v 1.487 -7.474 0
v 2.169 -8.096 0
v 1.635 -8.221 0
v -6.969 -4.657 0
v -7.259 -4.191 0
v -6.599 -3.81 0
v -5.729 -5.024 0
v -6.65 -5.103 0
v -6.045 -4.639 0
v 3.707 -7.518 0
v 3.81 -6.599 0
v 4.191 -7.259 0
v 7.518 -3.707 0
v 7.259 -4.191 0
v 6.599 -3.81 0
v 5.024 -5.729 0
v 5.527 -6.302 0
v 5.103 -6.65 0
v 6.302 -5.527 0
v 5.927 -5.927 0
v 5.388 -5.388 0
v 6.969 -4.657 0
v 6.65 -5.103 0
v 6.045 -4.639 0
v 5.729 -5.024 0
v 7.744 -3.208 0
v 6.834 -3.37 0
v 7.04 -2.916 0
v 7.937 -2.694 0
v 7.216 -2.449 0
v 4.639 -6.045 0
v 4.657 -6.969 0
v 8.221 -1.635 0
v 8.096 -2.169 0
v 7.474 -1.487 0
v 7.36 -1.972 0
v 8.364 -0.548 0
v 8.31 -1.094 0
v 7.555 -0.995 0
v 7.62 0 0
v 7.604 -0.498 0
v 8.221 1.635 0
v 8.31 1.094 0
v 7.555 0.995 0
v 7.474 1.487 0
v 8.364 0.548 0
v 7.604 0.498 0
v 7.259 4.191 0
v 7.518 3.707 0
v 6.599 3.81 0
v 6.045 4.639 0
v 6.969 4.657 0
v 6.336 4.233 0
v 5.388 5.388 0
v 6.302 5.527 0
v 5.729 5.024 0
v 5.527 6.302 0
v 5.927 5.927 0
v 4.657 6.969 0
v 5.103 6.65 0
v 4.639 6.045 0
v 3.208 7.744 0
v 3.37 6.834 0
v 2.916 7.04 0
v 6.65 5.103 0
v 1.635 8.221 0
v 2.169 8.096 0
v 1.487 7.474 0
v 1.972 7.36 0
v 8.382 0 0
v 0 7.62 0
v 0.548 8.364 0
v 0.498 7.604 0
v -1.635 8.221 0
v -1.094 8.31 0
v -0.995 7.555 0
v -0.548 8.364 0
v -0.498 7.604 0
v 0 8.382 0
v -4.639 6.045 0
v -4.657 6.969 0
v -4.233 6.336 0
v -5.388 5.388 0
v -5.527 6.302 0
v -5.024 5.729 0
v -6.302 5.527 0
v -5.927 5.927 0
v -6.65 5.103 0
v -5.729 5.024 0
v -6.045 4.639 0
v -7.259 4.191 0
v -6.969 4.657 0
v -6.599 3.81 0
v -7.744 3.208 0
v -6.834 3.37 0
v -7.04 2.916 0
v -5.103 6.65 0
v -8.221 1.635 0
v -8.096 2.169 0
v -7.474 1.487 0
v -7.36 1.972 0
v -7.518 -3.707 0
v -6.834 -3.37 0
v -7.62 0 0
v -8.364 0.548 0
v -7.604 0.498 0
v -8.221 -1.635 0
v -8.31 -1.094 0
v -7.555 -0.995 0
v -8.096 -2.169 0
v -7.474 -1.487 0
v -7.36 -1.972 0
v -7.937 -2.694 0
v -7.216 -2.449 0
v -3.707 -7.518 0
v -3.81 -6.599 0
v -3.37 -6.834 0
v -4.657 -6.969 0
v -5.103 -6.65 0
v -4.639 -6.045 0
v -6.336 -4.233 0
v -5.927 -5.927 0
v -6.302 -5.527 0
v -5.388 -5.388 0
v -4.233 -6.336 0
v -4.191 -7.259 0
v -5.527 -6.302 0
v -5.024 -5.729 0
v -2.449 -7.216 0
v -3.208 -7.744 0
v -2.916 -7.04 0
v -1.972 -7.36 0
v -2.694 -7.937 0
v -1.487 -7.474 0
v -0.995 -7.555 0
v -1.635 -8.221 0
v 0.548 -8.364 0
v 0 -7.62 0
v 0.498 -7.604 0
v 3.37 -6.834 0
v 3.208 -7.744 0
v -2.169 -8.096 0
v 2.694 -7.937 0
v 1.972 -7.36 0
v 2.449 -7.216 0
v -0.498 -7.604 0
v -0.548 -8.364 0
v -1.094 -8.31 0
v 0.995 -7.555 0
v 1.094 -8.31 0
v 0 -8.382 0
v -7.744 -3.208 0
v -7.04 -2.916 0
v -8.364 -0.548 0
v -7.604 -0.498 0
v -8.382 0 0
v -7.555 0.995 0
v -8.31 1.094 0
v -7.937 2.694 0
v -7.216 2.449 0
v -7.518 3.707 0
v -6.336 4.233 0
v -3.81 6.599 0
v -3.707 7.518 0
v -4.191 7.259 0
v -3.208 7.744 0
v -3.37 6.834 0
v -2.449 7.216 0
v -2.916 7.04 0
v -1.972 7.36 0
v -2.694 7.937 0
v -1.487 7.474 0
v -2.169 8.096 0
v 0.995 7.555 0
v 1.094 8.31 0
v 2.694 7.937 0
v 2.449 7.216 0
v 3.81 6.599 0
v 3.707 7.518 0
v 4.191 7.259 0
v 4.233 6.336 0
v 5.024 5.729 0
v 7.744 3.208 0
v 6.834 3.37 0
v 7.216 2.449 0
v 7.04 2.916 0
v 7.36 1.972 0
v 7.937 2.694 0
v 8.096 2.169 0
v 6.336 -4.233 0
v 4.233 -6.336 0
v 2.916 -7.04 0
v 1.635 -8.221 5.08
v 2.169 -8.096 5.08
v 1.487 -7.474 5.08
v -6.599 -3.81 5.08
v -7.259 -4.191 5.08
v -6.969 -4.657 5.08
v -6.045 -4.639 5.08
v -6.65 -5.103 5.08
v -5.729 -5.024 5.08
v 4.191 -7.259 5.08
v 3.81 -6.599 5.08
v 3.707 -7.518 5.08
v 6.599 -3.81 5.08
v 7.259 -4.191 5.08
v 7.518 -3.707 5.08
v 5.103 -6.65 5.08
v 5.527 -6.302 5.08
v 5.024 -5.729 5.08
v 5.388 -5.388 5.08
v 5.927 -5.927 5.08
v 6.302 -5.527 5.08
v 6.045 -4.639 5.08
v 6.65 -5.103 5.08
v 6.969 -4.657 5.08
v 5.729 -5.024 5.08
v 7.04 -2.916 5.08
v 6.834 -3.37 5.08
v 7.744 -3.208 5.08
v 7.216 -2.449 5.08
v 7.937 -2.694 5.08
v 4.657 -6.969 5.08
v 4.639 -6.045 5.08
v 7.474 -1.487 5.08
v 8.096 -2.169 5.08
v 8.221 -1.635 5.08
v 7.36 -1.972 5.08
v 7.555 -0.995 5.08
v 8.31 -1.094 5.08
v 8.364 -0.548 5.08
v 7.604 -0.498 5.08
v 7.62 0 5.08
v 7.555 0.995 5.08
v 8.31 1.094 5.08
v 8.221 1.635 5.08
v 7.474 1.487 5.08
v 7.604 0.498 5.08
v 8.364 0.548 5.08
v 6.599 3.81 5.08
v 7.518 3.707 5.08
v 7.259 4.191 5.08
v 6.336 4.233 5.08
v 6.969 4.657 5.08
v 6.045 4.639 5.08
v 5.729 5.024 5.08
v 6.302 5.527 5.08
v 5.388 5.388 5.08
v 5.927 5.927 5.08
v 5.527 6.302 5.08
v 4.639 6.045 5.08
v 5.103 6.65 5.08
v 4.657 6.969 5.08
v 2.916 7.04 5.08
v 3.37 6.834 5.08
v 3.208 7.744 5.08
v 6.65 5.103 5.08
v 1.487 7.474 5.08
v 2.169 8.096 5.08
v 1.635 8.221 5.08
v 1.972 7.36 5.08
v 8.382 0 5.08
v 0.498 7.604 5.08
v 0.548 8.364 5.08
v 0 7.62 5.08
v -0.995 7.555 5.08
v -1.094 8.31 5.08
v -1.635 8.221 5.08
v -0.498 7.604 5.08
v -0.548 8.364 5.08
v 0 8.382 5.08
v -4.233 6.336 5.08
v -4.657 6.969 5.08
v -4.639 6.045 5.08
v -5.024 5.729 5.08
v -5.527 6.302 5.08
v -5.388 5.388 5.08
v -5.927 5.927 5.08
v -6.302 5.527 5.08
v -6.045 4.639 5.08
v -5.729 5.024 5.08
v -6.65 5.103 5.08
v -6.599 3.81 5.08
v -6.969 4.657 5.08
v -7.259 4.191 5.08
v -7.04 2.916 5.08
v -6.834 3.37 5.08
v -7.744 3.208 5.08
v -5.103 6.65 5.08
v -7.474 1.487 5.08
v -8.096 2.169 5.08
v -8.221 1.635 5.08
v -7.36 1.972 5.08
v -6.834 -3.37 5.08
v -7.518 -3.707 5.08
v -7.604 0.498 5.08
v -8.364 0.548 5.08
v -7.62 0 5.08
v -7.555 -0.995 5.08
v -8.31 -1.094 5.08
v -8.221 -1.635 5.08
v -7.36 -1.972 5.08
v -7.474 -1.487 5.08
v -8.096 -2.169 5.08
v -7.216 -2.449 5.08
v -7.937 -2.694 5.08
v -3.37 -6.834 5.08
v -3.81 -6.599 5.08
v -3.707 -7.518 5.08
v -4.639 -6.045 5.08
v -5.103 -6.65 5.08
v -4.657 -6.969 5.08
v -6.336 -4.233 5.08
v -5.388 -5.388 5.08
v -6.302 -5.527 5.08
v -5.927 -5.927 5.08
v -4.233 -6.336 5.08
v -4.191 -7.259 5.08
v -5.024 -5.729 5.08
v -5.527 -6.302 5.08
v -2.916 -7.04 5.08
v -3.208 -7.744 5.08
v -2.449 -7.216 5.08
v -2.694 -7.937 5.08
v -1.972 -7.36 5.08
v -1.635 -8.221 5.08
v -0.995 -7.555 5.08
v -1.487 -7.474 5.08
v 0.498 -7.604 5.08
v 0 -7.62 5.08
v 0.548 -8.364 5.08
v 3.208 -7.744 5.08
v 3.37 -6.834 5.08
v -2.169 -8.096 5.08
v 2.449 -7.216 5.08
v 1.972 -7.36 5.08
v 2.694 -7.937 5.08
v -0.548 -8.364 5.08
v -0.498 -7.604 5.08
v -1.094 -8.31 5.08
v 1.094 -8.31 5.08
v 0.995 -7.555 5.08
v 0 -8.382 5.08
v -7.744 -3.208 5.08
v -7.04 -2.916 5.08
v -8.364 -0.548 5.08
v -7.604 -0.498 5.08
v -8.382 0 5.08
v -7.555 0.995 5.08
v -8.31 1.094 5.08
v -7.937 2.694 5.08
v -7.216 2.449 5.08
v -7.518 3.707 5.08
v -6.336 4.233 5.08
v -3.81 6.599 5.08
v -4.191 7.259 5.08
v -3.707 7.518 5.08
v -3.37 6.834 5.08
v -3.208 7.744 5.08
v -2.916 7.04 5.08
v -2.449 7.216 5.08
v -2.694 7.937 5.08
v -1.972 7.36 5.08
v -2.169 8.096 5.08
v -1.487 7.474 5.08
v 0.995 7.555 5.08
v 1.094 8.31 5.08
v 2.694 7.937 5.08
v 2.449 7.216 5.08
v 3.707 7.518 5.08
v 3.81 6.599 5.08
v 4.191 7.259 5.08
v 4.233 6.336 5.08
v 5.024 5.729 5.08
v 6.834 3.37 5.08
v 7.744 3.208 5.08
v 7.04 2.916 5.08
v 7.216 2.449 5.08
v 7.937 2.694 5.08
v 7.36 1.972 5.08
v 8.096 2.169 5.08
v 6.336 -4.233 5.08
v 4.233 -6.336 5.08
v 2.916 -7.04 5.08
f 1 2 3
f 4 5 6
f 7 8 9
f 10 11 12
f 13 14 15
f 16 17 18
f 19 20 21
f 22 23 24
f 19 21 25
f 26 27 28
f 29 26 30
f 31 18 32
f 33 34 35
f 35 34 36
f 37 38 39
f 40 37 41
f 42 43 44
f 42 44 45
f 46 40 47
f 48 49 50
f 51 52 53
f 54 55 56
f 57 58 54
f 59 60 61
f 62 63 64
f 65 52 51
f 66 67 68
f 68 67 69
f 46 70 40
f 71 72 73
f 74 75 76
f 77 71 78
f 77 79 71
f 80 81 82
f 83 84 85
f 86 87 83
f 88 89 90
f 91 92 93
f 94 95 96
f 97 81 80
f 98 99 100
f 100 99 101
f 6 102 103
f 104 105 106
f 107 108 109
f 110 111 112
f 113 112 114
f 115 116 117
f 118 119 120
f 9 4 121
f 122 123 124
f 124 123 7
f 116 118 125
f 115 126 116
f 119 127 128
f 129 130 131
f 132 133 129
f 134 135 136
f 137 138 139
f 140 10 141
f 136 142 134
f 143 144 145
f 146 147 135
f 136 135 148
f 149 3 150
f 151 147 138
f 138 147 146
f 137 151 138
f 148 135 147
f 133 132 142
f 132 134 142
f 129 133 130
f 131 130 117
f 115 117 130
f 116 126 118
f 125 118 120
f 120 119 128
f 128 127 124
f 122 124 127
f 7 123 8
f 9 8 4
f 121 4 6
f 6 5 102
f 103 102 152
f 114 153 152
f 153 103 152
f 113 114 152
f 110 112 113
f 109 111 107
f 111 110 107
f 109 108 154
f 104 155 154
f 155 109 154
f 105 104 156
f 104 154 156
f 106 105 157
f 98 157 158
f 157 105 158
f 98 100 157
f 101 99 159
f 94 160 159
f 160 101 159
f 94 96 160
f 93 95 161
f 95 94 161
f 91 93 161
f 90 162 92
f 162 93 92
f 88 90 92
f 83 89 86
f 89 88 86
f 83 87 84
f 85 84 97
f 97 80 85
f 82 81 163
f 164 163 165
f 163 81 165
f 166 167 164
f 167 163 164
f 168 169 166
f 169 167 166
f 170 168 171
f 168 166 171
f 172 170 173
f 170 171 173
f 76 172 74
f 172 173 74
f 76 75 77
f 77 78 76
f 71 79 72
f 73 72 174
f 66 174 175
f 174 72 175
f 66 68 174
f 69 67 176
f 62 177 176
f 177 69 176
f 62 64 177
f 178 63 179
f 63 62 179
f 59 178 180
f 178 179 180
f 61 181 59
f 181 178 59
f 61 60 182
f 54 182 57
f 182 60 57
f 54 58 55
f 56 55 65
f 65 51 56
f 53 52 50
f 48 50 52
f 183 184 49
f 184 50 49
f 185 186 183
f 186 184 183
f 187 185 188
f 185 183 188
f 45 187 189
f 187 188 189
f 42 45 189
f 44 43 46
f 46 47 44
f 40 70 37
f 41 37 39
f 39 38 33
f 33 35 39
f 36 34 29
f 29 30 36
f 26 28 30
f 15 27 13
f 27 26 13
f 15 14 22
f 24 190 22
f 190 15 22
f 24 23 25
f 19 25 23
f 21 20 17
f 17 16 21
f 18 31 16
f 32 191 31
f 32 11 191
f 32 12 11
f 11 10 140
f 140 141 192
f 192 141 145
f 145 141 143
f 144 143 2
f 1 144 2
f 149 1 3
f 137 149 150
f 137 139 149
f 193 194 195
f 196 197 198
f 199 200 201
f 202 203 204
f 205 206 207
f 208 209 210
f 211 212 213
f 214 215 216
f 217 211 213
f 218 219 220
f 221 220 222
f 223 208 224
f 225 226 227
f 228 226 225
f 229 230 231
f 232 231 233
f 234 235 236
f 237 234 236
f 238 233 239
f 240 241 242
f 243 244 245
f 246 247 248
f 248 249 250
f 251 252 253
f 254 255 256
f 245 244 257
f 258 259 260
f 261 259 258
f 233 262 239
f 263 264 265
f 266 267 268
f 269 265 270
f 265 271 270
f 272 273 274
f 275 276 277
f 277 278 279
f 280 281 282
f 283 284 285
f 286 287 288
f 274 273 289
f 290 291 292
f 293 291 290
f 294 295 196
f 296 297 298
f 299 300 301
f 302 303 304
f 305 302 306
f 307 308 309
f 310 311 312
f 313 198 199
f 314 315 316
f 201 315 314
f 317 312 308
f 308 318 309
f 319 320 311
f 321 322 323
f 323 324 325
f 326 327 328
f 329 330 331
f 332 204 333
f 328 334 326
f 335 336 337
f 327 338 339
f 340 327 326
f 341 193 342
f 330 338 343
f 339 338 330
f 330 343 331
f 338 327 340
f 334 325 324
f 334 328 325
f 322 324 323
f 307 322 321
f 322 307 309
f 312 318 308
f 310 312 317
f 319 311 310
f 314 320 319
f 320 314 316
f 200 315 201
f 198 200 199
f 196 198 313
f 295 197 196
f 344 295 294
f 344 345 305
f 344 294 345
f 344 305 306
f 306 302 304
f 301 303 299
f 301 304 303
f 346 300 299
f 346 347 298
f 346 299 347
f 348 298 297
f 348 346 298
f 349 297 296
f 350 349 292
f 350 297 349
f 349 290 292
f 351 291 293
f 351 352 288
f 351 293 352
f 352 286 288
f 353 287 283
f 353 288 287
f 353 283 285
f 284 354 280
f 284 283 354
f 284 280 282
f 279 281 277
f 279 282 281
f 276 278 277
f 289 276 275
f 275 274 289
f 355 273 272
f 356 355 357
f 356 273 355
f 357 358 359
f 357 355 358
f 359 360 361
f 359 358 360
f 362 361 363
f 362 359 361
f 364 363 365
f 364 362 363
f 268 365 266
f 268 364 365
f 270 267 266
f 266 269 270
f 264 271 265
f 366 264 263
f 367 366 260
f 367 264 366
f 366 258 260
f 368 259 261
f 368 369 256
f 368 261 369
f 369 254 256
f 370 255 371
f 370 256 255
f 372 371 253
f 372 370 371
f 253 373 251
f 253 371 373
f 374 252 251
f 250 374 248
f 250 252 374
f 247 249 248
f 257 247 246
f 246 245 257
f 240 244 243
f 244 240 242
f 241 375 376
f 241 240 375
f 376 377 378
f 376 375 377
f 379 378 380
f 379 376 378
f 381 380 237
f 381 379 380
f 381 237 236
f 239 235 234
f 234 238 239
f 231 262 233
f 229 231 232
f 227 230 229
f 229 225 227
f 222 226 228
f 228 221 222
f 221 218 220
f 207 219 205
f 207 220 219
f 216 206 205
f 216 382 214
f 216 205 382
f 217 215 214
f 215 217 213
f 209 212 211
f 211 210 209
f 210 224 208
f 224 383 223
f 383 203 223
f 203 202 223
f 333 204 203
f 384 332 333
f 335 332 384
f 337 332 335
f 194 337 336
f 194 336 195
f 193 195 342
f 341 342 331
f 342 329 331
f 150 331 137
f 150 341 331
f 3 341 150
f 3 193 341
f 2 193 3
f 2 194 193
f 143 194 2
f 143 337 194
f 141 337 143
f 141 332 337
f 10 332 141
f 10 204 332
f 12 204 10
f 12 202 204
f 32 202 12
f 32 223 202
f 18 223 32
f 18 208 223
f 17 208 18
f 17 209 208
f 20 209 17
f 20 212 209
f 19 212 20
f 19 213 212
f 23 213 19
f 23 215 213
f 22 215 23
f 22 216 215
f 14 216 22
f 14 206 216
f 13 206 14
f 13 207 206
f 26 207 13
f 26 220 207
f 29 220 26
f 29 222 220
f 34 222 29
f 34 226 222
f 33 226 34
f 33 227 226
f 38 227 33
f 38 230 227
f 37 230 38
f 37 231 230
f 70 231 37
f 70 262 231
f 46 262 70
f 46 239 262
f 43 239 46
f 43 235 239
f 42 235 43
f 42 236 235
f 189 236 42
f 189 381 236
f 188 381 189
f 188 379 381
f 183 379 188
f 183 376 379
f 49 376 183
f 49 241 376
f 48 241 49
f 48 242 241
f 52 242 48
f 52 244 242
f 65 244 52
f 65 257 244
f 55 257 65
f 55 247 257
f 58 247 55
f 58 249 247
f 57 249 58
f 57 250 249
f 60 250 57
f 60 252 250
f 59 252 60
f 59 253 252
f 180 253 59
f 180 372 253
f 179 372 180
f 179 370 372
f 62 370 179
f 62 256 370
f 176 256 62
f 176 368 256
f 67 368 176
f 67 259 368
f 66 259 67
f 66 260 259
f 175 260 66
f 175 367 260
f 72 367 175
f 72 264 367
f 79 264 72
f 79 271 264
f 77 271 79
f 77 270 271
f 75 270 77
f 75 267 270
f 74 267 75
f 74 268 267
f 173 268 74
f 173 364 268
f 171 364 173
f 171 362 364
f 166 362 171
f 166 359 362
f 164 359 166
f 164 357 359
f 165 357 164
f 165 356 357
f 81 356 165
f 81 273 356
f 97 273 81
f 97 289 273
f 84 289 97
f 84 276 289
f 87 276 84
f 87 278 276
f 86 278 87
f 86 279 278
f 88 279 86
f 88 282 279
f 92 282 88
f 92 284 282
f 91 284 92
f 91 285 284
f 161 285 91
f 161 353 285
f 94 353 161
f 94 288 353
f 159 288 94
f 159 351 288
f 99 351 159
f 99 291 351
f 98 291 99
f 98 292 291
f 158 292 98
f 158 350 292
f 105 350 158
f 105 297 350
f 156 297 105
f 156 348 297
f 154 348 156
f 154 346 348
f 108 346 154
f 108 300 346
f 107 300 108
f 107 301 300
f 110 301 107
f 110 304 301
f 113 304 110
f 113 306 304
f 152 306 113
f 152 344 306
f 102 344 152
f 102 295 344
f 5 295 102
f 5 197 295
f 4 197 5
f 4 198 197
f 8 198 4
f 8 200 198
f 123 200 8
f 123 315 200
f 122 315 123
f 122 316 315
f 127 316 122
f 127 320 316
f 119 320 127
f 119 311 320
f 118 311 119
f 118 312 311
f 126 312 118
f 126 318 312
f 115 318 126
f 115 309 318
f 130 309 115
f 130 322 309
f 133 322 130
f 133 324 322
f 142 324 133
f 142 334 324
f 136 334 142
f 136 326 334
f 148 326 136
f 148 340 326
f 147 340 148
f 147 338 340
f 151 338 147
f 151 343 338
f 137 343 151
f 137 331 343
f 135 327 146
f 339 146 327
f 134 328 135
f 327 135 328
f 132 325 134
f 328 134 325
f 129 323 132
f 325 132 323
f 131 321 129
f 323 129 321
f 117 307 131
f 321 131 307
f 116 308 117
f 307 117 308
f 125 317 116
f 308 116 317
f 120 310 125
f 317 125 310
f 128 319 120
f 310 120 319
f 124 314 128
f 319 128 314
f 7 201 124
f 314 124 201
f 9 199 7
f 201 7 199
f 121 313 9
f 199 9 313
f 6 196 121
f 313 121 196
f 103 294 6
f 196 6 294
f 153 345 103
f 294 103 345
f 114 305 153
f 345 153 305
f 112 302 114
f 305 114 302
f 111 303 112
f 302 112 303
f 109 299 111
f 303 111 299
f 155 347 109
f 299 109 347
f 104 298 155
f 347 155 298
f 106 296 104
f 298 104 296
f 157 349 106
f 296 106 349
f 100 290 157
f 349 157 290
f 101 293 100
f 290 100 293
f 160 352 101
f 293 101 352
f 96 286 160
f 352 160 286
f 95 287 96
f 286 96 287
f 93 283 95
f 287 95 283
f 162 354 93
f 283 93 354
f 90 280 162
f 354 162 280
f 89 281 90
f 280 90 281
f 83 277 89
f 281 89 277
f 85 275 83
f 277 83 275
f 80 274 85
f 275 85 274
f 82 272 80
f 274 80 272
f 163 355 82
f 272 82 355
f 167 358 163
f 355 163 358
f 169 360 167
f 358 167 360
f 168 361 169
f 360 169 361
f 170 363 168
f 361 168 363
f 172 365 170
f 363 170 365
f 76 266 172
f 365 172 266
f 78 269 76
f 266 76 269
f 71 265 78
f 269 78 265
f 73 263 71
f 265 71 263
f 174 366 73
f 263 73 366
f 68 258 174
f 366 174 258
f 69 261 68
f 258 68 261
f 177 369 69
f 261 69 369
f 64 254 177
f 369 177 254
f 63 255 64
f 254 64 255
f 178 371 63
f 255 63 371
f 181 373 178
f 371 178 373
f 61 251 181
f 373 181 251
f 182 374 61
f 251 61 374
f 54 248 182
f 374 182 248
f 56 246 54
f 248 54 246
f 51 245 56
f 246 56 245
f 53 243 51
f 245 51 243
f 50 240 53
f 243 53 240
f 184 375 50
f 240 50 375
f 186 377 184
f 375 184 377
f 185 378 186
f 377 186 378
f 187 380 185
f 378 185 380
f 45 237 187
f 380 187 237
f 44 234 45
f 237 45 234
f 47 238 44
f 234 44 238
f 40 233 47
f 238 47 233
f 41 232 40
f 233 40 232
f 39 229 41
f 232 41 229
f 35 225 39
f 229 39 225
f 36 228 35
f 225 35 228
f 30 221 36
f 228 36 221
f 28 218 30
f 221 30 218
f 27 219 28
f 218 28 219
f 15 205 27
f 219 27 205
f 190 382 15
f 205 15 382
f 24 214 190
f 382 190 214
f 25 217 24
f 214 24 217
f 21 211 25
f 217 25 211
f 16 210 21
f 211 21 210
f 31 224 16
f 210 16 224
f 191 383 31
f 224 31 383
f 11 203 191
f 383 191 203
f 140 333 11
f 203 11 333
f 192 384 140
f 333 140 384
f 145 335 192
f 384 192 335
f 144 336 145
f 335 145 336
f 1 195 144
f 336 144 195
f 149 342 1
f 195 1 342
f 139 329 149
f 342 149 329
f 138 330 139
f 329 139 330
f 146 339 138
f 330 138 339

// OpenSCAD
ViewScale = [0.0254, 0.0254, 0.0254];

// pendia = 576m

scale(ViewScale)
{
    linear_extrude(200)
    difference() {
        circle(660/2, $fn=96);
        circle(600/2, $fn=96);
    }
}
